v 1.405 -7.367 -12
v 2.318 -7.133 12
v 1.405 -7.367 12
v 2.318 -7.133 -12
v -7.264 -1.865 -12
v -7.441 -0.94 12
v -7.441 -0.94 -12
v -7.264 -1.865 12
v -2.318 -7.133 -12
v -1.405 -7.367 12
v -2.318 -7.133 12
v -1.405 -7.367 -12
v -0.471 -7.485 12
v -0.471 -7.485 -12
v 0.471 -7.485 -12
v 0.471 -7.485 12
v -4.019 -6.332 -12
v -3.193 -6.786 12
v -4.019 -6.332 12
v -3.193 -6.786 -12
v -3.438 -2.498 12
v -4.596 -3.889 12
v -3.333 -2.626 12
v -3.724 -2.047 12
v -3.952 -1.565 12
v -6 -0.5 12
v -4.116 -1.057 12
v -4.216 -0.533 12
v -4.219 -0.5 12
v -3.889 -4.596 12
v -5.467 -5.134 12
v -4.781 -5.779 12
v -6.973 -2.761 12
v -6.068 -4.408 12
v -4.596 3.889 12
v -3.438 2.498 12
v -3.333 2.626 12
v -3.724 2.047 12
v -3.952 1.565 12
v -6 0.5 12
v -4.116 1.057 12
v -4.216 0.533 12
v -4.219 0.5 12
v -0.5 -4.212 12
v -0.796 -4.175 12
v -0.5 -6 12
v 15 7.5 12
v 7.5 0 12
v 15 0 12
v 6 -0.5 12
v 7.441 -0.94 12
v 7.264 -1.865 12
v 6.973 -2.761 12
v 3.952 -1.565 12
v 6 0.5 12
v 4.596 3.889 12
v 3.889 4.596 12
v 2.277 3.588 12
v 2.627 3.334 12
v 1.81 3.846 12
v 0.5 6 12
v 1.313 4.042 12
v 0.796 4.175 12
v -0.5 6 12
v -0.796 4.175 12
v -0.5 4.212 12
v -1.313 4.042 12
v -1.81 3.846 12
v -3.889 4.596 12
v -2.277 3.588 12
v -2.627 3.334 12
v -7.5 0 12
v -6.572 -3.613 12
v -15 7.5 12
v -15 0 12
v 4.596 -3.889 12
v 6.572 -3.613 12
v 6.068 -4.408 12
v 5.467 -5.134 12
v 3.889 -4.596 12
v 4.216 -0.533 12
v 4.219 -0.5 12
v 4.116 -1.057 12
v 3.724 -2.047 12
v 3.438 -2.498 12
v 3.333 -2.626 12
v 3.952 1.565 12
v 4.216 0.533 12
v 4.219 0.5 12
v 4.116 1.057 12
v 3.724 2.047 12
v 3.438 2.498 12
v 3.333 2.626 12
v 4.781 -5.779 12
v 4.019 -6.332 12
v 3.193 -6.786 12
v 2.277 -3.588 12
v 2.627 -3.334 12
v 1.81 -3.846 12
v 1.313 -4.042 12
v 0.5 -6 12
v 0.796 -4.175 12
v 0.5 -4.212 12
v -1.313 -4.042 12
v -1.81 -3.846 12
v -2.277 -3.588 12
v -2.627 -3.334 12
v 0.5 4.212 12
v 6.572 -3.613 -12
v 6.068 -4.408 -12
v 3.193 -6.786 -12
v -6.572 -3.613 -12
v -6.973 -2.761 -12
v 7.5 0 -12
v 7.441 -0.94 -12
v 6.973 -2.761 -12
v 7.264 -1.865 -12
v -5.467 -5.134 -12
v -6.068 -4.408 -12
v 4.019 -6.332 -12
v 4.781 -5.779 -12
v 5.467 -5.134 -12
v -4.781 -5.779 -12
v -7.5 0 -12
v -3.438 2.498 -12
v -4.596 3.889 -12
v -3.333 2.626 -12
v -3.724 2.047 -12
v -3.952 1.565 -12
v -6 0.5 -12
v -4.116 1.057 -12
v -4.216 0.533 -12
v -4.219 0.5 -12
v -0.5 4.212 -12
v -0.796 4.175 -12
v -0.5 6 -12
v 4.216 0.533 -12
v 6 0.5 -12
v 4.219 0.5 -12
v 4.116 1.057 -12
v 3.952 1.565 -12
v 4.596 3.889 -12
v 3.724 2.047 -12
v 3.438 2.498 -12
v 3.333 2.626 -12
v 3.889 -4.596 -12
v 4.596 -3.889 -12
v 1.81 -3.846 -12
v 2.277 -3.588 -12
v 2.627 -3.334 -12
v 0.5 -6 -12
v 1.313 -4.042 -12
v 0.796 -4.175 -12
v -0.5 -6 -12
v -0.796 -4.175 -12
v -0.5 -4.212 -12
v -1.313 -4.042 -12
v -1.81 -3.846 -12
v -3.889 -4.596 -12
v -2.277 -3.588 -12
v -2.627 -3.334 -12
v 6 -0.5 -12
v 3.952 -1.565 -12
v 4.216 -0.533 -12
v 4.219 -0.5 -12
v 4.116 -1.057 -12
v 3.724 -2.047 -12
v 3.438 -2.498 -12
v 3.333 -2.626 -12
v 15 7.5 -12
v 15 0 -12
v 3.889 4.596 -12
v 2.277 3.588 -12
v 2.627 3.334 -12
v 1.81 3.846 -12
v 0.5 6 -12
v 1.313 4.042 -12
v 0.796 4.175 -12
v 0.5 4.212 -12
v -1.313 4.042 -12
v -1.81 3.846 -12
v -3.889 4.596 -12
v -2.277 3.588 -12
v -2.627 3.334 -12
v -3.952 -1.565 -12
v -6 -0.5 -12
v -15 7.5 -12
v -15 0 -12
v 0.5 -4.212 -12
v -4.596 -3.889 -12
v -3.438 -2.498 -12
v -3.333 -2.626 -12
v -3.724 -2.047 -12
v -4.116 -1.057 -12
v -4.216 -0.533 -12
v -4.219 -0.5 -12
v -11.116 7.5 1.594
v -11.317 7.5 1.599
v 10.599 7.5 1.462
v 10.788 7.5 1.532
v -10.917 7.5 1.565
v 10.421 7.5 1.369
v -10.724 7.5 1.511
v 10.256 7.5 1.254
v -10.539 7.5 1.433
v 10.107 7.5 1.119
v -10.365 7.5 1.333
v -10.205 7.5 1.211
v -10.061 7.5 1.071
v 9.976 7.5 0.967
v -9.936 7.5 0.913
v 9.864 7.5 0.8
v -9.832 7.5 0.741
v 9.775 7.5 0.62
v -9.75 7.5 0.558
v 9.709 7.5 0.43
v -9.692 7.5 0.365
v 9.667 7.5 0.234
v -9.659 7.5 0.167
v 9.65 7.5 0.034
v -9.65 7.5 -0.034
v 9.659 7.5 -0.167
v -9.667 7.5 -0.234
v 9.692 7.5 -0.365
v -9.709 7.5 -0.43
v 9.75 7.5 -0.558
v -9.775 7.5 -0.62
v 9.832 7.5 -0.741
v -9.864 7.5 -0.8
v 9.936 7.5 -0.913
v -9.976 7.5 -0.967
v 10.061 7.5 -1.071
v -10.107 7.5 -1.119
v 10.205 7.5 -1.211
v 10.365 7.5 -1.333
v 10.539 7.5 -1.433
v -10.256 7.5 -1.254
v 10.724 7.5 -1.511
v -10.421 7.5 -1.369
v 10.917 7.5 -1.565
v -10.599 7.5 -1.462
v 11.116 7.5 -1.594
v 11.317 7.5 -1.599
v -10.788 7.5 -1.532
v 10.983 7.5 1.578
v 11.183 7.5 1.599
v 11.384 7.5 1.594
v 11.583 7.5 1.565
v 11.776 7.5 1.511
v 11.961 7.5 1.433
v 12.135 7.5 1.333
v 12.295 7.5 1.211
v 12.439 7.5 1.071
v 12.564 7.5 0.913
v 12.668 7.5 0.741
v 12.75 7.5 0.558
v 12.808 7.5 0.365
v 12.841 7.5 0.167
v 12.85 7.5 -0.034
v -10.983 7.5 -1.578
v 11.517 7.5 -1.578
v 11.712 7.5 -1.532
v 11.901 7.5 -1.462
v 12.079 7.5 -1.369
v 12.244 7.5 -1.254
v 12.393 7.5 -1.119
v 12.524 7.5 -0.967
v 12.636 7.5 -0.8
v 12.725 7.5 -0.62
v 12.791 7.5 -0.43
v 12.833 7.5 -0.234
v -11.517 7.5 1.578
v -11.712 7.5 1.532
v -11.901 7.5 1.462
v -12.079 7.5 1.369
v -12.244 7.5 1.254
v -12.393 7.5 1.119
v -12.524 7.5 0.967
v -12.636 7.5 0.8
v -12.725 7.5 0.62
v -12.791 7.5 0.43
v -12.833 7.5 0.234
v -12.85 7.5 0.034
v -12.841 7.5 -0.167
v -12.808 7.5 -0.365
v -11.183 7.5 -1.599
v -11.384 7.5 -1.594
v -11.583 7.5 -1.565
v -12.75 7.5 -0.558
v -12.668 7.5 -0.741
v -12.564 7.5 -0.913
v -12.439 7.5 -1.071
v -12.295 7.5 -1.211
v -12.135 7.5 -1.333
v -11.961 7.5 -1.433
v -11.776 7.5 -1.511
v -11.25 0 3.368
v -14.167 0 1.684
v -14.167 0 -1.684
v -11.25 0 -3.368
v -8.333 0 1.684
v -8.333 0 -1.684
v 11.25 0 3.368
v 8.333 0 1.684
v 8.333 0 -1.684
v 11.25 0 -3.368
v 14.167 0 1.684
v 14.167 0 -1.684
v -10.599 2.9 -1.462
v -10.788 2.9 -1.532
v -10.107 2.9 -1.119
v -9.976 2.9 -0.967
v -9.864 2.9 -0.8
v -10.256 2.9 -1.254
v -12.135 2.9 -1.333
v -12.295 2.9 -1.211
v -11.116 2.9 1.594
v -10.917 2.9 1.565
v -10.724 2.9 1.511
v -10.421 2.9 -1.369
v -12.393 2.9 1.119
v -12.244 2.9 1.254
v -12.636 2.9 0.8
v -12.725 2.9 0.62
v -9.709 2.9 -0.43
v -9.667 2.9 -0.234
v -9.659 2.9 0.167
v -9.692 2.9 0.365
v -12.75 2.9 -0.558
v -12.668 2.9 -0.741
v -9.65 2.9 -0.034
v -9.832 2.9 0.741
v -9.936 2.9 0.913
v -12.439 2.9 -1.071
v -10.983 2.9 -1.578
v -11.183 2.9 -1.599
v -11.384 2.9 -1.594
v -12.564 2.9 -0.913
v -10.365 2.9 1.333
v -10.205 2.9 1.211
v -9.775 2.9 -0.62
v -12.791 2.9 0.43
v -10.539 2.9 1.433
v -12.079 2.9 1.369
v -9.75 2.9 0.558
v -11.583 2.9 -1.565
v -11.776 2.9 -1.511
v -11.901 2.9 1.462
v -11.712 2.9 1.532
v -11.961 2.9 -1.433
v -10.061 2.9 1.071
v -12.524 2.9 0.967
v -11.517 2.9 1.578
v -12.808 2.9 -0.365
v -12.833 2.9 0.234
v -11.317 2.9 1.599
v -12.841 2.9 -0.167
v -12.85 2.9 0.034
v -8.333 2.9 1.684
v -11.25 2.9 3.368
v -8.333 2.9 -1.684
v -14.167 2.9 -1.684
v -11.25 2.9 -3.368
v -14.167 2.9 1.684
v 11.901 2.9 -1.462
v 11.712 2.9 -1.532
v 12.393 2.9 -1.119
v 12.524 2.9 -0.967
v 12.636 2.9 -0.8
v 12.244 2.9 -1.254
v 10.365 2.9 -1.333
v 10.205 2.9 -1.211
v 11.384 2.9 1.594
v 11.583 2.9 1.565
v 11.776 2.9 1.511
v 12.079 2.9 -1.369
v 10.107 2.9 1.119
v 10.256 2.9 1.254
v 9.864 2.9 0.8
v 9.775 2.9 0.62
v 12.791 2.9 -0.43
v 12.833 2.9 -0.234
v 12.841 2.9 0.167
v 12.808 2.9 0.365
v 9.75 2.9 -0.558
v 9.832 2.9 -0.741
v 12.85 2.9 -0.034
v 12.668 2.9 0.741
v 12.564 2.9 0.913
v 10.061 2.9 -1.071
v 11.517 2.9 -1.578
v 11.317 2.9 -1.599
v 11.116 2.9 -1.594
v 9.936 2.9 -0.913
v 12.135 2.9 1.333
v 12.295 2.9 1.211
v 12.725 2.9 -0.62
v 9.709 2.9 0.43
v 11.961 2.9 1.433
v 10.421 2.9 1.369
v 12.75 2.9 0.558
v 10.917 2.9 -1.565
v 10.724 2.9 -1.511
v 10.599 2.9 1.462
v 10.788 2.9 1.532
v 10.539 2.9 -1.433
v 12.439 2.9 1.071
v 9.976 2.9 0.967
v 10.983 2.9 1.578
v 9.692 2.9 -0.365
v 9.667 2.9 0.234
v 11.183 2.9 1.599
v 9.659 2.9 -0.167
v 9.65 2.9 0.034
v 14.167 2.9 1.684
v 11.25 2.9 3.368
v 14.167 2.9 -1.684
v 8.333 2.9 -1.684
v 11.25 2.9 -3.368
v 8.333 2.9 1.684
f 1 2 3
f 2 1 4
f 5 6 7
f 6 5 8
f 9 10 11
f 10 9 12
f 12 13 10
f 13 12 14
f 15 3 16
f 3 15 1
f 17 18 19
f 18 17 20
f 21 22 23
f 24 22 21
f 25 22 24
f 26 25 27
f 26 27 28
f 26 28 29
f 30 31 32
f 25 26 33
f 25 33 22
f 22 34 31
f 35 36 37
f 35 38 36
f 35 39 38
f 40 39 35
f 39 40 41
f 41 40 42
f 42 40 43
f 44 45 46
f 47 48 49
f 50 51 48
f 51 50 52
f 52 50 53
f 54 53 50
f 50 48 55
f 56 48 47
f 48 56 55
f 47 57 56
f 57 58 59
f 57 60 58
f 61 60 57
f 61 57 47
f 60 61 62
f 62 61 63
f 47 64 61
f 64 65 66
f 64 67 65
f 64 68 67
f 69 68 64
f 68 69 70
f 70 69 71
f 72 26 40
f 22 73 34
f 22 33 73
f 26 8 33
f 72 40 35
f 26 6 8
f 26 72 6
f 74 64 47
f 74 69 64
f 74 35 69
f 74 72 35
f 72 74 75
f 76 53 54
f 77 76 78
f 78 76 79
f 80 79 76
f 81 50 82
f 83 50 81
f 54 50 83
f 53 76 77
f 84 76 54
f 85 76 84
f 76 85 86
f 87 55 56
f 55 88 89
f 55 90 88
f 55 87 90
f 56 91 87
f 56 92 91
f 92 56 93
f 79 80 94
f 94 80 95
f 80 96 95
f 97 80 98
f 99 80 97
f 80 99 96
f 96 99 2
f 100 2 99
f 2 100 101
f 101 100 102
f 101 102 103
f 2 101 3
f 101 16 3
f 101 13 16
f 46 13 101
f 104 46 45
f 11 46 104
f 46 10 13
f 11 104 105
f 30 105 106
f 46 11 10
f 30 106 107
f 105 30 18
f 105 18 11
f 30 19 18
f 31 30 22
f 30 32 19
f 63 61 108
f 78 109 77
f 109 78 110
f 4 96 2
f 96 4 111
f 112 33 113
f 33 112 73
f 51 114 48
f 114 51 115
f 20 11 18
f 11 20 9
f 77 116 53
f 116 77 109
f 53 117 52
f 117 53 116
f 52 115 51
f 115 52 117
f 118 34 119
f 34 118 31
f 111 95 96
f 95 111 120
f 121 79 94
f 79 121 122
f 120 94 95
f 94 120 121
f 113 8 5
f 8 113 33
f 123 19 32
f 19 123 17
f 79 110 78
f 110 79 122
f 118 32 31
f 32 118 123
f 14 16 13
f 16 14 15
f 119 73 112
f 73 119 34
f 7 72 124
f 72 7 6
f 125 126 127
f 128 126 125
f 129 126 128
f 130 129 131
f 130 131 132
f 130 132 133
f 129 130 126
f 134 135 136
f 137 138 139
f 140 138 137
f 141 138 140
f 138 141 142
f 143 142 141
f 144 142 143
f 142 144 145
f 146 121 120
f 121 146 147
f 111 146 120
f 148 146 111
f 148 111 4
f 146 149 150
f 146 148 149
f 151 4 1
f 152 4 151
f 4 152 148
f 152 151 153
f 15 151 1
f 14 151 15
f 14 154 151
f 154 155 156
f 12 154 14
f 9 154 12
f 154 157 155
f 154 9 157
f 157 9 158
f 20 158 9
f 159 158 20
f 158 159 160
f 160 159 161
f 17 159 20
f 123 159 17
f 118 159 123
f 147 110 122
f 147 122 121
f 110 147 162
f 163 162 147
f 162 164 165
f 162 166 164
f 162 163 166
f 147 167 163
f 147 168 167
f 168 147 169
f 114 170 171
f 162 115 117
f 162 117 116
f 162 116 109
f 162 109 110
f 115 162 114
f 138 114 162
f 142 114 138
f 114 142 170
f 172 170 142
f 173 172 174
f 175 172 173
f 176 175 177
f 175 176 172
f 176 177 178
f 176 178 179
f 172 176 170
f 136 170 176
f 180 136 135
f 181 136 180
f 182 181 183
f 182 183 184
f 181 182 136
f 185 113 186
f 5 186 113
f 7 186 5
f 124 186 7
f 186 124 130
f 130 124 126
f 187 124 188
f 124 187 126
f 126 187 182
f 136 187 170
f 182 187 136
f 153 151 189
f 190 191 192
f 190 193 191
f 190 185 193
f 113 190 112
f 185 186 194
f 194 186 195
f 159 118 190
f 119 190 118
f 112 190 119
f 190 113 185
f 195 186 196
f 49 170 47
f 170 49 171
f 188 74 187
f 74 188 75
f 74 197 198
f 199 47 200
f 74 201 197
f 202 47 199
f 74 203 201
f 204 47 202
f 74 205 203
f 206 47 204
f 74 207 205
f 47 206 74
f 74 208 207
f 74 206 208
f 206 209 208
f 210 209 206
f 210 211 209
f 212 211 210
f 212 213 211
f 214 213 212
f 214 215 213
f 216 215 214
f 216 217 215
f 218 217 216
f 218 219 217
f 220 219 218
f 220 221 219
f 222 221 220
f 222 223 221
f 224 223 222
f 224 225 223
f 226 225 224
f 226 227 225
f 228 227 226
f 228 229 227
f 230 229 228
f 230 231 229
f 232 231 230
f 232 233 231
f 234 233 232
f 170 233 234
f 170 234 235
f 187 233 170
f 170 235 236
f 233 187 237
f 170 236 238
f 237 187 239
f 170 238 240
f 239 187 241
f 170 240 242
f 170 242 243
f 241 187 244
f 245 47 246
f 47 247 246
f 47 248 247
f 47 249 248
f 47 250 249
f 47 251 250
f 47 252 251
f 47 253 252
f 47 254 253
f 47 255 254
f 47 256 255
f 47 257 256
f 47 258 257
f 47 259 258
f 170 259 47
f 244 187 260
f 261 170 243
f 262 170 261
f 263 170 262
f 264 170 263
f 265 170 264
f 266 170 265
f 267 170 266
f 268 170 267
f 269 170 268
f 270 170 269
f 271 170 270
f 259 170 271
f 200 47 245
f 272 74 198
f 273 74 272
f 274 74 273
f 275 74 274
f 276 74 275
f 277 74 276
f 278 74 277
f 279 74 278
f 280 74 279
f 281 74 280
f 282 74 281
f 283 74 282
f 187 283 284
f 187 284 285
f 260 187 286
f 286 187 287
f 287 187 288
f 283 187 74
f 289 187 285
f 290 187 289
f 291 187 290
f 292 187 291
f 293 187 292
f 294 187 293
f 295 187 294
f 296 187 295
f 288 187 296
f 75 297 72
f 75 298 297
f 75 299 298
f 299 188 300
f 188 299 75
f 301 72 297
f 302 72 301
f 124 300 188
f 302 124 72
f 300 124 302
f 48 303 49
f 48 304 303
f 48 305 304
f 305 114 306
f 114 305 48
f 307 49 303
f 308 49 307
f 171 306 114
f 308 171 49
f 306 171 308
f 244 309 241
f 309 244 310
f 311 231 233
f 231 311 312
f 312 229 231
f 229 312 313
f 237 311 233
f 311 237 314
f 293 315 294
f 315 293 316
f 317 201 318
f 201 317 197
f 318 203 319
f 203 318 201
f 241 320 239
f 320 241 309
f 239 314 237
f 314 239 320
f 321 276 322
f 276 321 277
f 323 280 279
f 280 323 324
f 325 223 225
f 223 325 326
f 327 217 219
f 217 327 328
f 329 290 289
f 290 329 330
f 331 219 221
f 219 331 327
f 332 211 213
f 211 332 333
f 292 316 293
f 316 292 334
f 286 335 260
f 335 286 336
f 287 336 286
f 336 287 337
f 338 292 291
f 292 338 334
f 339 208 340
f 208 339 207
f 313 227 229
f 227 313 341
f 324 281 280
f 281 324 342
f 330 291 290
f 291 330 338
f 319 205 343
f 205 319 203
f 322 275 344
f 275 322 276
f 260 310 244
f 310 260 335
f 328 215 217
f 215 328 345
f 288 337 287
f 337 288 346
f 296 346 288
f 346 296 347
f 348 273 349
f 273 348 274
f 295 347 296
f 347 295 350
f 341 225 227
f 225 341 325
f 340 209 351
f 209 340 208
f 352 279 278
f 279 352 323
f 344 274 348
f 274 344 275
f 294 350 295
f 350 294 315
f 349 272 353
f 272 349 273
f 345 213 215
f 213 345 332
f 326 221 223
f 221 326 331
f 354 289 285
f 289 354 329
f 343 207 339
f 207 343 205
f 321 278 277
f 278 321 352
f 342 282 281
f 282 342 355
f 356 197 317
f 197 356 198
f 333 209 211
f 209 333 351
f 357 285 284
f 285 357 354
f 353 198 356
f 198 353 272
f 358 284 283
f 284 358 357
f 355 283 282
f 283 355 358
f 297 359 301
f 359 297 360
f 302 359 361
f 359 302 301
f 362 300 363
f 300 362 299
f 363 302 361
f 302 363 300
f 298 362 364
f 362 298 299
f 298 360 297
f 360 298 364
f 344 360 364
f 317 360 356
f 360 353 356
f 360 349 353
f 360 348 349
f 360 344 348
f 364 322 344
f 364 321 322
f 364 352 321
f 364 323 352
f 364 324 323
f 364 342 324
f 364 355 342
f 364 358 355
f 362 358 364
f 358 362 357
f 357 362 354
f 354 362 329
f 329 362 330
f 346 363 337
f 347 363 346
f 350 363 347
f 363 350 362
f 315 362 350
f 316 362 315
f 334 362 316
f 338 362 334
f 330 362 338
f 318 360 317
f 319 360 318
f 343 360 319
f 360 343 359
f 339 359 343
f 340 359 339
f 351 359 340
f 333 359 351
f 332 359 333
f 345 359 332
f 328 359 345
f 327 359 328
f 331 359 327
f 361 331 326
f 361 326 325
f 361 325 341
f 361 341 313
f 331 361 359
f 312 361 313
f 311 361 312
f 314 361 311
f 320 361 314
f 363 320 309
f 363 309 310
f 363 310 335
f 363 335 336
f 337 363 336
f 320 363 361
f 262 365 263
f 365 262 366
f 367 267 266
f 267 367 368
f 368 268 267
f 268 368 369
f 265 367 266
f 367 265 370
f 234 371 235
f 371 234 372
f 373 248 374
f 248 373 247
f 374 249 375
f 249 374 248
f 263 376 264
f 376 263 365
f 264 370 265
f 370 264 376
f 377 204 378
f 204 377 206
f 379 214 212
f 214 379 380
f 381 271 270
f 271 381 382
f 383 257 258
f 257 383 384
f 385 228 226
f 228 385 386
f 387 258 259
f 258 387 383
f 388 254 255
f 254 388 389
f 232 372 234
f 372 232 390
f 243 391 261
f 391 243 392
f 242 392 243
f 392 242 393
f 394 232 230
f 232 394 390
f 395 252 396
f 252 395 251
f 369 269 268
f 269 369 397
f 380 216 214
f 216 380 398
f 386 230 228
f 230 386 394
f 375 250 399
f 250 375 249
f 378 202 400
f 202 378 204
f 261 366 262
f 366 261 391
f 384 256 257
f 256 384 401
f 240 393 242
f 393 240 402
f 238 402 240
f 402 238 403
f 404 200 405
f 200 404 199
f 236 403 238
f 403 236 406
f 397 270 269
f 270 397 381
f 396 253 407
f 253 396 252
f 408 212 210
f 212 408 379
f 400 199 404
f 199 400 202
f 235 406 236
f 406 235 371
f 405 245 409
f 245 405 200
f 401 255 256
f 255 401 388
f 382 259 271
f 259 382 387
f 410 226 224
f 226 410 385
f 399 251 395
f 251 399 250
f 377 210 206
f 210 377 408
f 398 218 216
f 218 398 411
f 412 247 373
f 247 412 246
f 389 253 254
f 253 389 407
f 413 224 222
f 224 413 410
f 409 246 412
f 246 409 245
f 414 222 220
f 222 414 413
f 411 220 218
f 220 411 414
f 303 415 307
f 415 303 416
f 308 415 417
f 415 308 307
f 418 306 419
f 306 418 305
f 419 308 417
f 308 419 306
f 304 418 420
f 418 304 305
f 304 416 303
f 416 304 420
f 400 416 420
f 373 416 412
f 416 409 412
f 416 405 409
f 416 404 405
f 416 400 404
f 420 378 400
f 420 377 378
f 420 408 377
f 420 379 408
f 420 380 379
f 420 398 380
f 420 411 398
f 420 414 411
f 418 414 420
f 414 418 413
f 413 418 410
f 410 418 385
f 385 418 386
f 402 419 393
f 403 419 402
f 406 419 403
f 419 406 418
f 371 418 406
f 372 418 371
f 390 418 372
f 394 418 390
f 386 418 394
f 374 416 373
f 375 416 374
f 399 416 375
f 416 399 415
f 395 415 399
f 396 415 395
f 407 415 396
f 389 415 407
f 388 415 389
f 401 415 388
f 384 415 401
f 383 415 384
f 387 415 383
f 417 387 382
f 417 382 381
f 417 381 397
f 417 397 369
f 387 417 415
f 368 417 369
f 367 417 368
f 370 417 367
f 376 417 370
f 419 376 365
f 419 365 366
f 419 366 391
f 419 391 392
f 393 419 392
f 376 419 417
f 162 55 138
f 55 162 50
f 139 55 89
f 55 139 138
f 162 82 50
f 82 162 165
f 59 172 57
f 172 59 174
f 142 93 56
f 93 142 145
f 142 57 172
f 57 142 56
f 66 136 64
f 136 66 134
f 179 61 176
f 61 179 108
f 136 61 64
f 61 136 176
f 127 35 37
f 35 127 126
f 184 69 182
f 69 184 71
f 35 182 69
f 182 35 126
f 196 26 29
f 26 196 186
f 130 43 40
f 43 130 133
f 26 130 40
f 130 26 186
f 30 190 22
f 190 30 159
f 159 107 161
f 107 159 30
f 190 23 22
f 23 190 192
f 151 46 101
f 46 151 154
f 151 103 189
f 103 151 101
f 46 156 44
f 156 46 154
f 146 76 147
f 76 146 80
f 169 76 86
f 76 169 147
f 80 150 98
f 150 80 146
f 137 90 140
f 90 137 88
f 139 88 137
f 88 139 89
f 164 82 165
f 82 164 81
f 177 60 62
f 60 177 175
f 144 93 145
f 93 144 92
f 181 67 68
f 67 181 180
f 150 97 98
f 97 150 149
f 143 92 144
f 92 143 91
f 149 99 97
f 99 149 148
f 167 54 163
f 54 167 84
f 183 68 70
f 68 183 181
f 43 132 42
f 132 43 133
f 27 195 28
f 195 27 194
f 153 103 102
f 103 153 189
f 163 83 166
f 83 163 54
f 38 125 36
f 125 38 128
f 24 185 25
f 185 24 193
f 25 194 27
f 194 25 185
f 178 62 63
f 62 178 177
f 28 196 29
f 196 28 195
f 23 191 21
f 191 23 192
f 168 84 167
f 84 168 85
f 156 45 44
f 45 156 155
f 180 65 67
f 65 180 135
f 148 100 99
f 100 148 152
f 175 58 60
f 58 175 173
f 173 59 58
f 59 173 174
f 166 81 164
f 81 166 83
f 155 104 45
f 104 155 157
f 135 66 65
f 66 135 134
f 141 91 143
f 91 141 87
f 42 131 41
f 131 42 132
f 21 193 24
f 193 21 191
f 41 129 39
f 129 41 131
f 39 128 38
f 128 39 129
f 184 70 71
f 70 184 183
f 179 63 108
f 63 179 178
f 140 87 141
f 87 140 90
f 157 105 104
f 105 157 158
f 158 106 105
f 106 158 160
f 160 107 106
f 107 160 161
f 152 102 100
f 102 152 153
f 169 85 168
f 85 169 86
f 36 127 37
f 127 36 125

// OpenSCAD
/*
    To create plastic linear bearings similar to the Igus® Drylin® RJ4JP-01-08 Sliding Bearing.

    You can choose to either create just the bearing or incorporate it in a block ready to mount.
    
    print in PLA for the properties of the harder plastic also concidder some kind of lubrication.
    
    inspired by:
    Toothed Linear Bearing by KR2
    www.thingiverse.com/thing:18219
    
    And 
    
    SC8UU Bushing by AxMod
    www.thingiverse.com/thing:1126245
    

*/

/* [Bearing Settings]*/

Inside_Diameter = 8;
Outside_Diameter = 15;
Length = 24;
Wall_Thickness = 1.5;
Number_of_teeth = 8;


Block = "yes"; // [yes, no]

/* [Block Settings]*/

How_Many_Mounting_Holes = 2; //[0, 2, 4, 6]
//The Diameter of the mounting holes so for an M3 bolt put 3 if you want to cut your own thread or 3.4 if you prefer to use with a nut
Mounting_Holes_Diameter = 3.2;
// Size of the nut across it's flats
Nut_size = 5.4;
// Set to 0 if you do not want retaining holes for nut
Nut_Depth = 3;


// need to create the 30 degrees champher properly.

difference()
{
    union()
    {
        if (Block == "yes")
        {
            cylinder (h=Length, d= Outside_Diameter, center = true, $fn = 50);
            translate ([-Outside_Diameter,0,-0.5*Length]) cube([Outside_Diameter *2,0.5*Outside_Diameter, Length]);
        }
        if (Block == "no")
        {
        cylinder (h=Length -3, d= Outside_Diameter, center = true, $fn = 50);
        translate ([0,0,(Length - 3) /2]) cylinder (h=1.5 , d1= Outside_Diameter, d2 = Outside_Diameter-1.74, center = false, $fn = 50);
        translate ([0,0,-Length/2 ]) cylinder (h=1.5 , d2= Outside_Diameter, d1 = Outside_Diameter-1.74, center = false, $fn = 50);
        }
    }    
    cylinder (h=Length+ 0.2, d= Inside_Diameter+0.5, center = true, $fn = 50); // remove core
    
// remove bands on outside
    if (Block == "no")
    {
    translate ([0,0,(Length /2) - 3.25 - 1.1])
    {
        difference()
        {
            cylinder(h = 1.1, d= Outside_Diameter, center = false, $fn = 50);
            cylinder(h = 1.1, d= Outside_Diameter-0.4, center = false, $fn = 50);
        }
    }
    
        translate ([0,0,-(Length /2) + 3.25 ])
    {
        difference()
        {
            cylinder(h = 1.1, d= Outside_Diameter, center = false, $fn = 50);
            cylinder(h = 1.1, d= Outside_Diameter-0.4, center = false, $fn = 50);
        }
    }
    }
// Remove Mounting Holes for Block
    if (Block == "yes")
        {
            if (How_Many_Mounting_Holes == 2)
            {
                translate ([0,0,0])Screw_Holes ();
            }
            if (How_Many_Mounting_Holes == 4)
            {
                translate ([0,0,0.25*Length])Screw_Holes ();
                translate ([0,0,-0.25*Length])Screw_Holes ();
            }
            if (How_Many_Mounting_Holes == 6)
            {
                translate ([0,0,0.25*Length])Screw_Holes ();
                translate ([0,0,0])Screw_Holes ();
                translate ([0,0,-0.25*Length])Screw_Holes ();
            }
        }
    
// Teeth    
    for ( i = [ 0: Number_of_teeth])
    {
        A = 360 / Number_of_teeth;
        rotate ([0,0, A * i]) 
        {
            translate([0,-0.5,-(Length/2)]) cube ([0.5*(Outside_Diameter -(Wall_Thickness*2)),1,Length]);
            /*
            // this gives the slots between the teeth a rounded end but takes ages to render.
            intersection() 
            {
                cylinder ( h=Length, d = Outside_Diameter -(Wall_Thickness*2), center = true, $fn = 50);
                translate ([0,-0.5,- Length/2])cube(size = [(0.5*Outside_Diameter),1,Length], center = false);
            }*/
           // Hollow out teeth
            
        }
    }
    
}

module Screw_Holes ()
{
    
    nut = 2*((Nut_size / 2) / cos(30))+0.5;
    translate ([-0.75 *Outside_Diameter,-0.1,0])rotate([270,30,0]) 
    {
        cylinder(h=0.55*Outside_Diameter ,d=Mounting_Holes_Diameter, $fn = 50);
        cylinder(h=Nut_Depth ,d=nut, $fn = 6);
    }
    translate ([0.75 *Outside_Diameter,-0.1,0])rotate([270,30,0]) 
    {
        cylinder(h=0.55*Outside_Diameter ,d=Mounting_Holes_Diameter, $fn = 50);
        cylinder(h=Nut_Depth ,d=nut, $fn = 6);
    }

    
}
